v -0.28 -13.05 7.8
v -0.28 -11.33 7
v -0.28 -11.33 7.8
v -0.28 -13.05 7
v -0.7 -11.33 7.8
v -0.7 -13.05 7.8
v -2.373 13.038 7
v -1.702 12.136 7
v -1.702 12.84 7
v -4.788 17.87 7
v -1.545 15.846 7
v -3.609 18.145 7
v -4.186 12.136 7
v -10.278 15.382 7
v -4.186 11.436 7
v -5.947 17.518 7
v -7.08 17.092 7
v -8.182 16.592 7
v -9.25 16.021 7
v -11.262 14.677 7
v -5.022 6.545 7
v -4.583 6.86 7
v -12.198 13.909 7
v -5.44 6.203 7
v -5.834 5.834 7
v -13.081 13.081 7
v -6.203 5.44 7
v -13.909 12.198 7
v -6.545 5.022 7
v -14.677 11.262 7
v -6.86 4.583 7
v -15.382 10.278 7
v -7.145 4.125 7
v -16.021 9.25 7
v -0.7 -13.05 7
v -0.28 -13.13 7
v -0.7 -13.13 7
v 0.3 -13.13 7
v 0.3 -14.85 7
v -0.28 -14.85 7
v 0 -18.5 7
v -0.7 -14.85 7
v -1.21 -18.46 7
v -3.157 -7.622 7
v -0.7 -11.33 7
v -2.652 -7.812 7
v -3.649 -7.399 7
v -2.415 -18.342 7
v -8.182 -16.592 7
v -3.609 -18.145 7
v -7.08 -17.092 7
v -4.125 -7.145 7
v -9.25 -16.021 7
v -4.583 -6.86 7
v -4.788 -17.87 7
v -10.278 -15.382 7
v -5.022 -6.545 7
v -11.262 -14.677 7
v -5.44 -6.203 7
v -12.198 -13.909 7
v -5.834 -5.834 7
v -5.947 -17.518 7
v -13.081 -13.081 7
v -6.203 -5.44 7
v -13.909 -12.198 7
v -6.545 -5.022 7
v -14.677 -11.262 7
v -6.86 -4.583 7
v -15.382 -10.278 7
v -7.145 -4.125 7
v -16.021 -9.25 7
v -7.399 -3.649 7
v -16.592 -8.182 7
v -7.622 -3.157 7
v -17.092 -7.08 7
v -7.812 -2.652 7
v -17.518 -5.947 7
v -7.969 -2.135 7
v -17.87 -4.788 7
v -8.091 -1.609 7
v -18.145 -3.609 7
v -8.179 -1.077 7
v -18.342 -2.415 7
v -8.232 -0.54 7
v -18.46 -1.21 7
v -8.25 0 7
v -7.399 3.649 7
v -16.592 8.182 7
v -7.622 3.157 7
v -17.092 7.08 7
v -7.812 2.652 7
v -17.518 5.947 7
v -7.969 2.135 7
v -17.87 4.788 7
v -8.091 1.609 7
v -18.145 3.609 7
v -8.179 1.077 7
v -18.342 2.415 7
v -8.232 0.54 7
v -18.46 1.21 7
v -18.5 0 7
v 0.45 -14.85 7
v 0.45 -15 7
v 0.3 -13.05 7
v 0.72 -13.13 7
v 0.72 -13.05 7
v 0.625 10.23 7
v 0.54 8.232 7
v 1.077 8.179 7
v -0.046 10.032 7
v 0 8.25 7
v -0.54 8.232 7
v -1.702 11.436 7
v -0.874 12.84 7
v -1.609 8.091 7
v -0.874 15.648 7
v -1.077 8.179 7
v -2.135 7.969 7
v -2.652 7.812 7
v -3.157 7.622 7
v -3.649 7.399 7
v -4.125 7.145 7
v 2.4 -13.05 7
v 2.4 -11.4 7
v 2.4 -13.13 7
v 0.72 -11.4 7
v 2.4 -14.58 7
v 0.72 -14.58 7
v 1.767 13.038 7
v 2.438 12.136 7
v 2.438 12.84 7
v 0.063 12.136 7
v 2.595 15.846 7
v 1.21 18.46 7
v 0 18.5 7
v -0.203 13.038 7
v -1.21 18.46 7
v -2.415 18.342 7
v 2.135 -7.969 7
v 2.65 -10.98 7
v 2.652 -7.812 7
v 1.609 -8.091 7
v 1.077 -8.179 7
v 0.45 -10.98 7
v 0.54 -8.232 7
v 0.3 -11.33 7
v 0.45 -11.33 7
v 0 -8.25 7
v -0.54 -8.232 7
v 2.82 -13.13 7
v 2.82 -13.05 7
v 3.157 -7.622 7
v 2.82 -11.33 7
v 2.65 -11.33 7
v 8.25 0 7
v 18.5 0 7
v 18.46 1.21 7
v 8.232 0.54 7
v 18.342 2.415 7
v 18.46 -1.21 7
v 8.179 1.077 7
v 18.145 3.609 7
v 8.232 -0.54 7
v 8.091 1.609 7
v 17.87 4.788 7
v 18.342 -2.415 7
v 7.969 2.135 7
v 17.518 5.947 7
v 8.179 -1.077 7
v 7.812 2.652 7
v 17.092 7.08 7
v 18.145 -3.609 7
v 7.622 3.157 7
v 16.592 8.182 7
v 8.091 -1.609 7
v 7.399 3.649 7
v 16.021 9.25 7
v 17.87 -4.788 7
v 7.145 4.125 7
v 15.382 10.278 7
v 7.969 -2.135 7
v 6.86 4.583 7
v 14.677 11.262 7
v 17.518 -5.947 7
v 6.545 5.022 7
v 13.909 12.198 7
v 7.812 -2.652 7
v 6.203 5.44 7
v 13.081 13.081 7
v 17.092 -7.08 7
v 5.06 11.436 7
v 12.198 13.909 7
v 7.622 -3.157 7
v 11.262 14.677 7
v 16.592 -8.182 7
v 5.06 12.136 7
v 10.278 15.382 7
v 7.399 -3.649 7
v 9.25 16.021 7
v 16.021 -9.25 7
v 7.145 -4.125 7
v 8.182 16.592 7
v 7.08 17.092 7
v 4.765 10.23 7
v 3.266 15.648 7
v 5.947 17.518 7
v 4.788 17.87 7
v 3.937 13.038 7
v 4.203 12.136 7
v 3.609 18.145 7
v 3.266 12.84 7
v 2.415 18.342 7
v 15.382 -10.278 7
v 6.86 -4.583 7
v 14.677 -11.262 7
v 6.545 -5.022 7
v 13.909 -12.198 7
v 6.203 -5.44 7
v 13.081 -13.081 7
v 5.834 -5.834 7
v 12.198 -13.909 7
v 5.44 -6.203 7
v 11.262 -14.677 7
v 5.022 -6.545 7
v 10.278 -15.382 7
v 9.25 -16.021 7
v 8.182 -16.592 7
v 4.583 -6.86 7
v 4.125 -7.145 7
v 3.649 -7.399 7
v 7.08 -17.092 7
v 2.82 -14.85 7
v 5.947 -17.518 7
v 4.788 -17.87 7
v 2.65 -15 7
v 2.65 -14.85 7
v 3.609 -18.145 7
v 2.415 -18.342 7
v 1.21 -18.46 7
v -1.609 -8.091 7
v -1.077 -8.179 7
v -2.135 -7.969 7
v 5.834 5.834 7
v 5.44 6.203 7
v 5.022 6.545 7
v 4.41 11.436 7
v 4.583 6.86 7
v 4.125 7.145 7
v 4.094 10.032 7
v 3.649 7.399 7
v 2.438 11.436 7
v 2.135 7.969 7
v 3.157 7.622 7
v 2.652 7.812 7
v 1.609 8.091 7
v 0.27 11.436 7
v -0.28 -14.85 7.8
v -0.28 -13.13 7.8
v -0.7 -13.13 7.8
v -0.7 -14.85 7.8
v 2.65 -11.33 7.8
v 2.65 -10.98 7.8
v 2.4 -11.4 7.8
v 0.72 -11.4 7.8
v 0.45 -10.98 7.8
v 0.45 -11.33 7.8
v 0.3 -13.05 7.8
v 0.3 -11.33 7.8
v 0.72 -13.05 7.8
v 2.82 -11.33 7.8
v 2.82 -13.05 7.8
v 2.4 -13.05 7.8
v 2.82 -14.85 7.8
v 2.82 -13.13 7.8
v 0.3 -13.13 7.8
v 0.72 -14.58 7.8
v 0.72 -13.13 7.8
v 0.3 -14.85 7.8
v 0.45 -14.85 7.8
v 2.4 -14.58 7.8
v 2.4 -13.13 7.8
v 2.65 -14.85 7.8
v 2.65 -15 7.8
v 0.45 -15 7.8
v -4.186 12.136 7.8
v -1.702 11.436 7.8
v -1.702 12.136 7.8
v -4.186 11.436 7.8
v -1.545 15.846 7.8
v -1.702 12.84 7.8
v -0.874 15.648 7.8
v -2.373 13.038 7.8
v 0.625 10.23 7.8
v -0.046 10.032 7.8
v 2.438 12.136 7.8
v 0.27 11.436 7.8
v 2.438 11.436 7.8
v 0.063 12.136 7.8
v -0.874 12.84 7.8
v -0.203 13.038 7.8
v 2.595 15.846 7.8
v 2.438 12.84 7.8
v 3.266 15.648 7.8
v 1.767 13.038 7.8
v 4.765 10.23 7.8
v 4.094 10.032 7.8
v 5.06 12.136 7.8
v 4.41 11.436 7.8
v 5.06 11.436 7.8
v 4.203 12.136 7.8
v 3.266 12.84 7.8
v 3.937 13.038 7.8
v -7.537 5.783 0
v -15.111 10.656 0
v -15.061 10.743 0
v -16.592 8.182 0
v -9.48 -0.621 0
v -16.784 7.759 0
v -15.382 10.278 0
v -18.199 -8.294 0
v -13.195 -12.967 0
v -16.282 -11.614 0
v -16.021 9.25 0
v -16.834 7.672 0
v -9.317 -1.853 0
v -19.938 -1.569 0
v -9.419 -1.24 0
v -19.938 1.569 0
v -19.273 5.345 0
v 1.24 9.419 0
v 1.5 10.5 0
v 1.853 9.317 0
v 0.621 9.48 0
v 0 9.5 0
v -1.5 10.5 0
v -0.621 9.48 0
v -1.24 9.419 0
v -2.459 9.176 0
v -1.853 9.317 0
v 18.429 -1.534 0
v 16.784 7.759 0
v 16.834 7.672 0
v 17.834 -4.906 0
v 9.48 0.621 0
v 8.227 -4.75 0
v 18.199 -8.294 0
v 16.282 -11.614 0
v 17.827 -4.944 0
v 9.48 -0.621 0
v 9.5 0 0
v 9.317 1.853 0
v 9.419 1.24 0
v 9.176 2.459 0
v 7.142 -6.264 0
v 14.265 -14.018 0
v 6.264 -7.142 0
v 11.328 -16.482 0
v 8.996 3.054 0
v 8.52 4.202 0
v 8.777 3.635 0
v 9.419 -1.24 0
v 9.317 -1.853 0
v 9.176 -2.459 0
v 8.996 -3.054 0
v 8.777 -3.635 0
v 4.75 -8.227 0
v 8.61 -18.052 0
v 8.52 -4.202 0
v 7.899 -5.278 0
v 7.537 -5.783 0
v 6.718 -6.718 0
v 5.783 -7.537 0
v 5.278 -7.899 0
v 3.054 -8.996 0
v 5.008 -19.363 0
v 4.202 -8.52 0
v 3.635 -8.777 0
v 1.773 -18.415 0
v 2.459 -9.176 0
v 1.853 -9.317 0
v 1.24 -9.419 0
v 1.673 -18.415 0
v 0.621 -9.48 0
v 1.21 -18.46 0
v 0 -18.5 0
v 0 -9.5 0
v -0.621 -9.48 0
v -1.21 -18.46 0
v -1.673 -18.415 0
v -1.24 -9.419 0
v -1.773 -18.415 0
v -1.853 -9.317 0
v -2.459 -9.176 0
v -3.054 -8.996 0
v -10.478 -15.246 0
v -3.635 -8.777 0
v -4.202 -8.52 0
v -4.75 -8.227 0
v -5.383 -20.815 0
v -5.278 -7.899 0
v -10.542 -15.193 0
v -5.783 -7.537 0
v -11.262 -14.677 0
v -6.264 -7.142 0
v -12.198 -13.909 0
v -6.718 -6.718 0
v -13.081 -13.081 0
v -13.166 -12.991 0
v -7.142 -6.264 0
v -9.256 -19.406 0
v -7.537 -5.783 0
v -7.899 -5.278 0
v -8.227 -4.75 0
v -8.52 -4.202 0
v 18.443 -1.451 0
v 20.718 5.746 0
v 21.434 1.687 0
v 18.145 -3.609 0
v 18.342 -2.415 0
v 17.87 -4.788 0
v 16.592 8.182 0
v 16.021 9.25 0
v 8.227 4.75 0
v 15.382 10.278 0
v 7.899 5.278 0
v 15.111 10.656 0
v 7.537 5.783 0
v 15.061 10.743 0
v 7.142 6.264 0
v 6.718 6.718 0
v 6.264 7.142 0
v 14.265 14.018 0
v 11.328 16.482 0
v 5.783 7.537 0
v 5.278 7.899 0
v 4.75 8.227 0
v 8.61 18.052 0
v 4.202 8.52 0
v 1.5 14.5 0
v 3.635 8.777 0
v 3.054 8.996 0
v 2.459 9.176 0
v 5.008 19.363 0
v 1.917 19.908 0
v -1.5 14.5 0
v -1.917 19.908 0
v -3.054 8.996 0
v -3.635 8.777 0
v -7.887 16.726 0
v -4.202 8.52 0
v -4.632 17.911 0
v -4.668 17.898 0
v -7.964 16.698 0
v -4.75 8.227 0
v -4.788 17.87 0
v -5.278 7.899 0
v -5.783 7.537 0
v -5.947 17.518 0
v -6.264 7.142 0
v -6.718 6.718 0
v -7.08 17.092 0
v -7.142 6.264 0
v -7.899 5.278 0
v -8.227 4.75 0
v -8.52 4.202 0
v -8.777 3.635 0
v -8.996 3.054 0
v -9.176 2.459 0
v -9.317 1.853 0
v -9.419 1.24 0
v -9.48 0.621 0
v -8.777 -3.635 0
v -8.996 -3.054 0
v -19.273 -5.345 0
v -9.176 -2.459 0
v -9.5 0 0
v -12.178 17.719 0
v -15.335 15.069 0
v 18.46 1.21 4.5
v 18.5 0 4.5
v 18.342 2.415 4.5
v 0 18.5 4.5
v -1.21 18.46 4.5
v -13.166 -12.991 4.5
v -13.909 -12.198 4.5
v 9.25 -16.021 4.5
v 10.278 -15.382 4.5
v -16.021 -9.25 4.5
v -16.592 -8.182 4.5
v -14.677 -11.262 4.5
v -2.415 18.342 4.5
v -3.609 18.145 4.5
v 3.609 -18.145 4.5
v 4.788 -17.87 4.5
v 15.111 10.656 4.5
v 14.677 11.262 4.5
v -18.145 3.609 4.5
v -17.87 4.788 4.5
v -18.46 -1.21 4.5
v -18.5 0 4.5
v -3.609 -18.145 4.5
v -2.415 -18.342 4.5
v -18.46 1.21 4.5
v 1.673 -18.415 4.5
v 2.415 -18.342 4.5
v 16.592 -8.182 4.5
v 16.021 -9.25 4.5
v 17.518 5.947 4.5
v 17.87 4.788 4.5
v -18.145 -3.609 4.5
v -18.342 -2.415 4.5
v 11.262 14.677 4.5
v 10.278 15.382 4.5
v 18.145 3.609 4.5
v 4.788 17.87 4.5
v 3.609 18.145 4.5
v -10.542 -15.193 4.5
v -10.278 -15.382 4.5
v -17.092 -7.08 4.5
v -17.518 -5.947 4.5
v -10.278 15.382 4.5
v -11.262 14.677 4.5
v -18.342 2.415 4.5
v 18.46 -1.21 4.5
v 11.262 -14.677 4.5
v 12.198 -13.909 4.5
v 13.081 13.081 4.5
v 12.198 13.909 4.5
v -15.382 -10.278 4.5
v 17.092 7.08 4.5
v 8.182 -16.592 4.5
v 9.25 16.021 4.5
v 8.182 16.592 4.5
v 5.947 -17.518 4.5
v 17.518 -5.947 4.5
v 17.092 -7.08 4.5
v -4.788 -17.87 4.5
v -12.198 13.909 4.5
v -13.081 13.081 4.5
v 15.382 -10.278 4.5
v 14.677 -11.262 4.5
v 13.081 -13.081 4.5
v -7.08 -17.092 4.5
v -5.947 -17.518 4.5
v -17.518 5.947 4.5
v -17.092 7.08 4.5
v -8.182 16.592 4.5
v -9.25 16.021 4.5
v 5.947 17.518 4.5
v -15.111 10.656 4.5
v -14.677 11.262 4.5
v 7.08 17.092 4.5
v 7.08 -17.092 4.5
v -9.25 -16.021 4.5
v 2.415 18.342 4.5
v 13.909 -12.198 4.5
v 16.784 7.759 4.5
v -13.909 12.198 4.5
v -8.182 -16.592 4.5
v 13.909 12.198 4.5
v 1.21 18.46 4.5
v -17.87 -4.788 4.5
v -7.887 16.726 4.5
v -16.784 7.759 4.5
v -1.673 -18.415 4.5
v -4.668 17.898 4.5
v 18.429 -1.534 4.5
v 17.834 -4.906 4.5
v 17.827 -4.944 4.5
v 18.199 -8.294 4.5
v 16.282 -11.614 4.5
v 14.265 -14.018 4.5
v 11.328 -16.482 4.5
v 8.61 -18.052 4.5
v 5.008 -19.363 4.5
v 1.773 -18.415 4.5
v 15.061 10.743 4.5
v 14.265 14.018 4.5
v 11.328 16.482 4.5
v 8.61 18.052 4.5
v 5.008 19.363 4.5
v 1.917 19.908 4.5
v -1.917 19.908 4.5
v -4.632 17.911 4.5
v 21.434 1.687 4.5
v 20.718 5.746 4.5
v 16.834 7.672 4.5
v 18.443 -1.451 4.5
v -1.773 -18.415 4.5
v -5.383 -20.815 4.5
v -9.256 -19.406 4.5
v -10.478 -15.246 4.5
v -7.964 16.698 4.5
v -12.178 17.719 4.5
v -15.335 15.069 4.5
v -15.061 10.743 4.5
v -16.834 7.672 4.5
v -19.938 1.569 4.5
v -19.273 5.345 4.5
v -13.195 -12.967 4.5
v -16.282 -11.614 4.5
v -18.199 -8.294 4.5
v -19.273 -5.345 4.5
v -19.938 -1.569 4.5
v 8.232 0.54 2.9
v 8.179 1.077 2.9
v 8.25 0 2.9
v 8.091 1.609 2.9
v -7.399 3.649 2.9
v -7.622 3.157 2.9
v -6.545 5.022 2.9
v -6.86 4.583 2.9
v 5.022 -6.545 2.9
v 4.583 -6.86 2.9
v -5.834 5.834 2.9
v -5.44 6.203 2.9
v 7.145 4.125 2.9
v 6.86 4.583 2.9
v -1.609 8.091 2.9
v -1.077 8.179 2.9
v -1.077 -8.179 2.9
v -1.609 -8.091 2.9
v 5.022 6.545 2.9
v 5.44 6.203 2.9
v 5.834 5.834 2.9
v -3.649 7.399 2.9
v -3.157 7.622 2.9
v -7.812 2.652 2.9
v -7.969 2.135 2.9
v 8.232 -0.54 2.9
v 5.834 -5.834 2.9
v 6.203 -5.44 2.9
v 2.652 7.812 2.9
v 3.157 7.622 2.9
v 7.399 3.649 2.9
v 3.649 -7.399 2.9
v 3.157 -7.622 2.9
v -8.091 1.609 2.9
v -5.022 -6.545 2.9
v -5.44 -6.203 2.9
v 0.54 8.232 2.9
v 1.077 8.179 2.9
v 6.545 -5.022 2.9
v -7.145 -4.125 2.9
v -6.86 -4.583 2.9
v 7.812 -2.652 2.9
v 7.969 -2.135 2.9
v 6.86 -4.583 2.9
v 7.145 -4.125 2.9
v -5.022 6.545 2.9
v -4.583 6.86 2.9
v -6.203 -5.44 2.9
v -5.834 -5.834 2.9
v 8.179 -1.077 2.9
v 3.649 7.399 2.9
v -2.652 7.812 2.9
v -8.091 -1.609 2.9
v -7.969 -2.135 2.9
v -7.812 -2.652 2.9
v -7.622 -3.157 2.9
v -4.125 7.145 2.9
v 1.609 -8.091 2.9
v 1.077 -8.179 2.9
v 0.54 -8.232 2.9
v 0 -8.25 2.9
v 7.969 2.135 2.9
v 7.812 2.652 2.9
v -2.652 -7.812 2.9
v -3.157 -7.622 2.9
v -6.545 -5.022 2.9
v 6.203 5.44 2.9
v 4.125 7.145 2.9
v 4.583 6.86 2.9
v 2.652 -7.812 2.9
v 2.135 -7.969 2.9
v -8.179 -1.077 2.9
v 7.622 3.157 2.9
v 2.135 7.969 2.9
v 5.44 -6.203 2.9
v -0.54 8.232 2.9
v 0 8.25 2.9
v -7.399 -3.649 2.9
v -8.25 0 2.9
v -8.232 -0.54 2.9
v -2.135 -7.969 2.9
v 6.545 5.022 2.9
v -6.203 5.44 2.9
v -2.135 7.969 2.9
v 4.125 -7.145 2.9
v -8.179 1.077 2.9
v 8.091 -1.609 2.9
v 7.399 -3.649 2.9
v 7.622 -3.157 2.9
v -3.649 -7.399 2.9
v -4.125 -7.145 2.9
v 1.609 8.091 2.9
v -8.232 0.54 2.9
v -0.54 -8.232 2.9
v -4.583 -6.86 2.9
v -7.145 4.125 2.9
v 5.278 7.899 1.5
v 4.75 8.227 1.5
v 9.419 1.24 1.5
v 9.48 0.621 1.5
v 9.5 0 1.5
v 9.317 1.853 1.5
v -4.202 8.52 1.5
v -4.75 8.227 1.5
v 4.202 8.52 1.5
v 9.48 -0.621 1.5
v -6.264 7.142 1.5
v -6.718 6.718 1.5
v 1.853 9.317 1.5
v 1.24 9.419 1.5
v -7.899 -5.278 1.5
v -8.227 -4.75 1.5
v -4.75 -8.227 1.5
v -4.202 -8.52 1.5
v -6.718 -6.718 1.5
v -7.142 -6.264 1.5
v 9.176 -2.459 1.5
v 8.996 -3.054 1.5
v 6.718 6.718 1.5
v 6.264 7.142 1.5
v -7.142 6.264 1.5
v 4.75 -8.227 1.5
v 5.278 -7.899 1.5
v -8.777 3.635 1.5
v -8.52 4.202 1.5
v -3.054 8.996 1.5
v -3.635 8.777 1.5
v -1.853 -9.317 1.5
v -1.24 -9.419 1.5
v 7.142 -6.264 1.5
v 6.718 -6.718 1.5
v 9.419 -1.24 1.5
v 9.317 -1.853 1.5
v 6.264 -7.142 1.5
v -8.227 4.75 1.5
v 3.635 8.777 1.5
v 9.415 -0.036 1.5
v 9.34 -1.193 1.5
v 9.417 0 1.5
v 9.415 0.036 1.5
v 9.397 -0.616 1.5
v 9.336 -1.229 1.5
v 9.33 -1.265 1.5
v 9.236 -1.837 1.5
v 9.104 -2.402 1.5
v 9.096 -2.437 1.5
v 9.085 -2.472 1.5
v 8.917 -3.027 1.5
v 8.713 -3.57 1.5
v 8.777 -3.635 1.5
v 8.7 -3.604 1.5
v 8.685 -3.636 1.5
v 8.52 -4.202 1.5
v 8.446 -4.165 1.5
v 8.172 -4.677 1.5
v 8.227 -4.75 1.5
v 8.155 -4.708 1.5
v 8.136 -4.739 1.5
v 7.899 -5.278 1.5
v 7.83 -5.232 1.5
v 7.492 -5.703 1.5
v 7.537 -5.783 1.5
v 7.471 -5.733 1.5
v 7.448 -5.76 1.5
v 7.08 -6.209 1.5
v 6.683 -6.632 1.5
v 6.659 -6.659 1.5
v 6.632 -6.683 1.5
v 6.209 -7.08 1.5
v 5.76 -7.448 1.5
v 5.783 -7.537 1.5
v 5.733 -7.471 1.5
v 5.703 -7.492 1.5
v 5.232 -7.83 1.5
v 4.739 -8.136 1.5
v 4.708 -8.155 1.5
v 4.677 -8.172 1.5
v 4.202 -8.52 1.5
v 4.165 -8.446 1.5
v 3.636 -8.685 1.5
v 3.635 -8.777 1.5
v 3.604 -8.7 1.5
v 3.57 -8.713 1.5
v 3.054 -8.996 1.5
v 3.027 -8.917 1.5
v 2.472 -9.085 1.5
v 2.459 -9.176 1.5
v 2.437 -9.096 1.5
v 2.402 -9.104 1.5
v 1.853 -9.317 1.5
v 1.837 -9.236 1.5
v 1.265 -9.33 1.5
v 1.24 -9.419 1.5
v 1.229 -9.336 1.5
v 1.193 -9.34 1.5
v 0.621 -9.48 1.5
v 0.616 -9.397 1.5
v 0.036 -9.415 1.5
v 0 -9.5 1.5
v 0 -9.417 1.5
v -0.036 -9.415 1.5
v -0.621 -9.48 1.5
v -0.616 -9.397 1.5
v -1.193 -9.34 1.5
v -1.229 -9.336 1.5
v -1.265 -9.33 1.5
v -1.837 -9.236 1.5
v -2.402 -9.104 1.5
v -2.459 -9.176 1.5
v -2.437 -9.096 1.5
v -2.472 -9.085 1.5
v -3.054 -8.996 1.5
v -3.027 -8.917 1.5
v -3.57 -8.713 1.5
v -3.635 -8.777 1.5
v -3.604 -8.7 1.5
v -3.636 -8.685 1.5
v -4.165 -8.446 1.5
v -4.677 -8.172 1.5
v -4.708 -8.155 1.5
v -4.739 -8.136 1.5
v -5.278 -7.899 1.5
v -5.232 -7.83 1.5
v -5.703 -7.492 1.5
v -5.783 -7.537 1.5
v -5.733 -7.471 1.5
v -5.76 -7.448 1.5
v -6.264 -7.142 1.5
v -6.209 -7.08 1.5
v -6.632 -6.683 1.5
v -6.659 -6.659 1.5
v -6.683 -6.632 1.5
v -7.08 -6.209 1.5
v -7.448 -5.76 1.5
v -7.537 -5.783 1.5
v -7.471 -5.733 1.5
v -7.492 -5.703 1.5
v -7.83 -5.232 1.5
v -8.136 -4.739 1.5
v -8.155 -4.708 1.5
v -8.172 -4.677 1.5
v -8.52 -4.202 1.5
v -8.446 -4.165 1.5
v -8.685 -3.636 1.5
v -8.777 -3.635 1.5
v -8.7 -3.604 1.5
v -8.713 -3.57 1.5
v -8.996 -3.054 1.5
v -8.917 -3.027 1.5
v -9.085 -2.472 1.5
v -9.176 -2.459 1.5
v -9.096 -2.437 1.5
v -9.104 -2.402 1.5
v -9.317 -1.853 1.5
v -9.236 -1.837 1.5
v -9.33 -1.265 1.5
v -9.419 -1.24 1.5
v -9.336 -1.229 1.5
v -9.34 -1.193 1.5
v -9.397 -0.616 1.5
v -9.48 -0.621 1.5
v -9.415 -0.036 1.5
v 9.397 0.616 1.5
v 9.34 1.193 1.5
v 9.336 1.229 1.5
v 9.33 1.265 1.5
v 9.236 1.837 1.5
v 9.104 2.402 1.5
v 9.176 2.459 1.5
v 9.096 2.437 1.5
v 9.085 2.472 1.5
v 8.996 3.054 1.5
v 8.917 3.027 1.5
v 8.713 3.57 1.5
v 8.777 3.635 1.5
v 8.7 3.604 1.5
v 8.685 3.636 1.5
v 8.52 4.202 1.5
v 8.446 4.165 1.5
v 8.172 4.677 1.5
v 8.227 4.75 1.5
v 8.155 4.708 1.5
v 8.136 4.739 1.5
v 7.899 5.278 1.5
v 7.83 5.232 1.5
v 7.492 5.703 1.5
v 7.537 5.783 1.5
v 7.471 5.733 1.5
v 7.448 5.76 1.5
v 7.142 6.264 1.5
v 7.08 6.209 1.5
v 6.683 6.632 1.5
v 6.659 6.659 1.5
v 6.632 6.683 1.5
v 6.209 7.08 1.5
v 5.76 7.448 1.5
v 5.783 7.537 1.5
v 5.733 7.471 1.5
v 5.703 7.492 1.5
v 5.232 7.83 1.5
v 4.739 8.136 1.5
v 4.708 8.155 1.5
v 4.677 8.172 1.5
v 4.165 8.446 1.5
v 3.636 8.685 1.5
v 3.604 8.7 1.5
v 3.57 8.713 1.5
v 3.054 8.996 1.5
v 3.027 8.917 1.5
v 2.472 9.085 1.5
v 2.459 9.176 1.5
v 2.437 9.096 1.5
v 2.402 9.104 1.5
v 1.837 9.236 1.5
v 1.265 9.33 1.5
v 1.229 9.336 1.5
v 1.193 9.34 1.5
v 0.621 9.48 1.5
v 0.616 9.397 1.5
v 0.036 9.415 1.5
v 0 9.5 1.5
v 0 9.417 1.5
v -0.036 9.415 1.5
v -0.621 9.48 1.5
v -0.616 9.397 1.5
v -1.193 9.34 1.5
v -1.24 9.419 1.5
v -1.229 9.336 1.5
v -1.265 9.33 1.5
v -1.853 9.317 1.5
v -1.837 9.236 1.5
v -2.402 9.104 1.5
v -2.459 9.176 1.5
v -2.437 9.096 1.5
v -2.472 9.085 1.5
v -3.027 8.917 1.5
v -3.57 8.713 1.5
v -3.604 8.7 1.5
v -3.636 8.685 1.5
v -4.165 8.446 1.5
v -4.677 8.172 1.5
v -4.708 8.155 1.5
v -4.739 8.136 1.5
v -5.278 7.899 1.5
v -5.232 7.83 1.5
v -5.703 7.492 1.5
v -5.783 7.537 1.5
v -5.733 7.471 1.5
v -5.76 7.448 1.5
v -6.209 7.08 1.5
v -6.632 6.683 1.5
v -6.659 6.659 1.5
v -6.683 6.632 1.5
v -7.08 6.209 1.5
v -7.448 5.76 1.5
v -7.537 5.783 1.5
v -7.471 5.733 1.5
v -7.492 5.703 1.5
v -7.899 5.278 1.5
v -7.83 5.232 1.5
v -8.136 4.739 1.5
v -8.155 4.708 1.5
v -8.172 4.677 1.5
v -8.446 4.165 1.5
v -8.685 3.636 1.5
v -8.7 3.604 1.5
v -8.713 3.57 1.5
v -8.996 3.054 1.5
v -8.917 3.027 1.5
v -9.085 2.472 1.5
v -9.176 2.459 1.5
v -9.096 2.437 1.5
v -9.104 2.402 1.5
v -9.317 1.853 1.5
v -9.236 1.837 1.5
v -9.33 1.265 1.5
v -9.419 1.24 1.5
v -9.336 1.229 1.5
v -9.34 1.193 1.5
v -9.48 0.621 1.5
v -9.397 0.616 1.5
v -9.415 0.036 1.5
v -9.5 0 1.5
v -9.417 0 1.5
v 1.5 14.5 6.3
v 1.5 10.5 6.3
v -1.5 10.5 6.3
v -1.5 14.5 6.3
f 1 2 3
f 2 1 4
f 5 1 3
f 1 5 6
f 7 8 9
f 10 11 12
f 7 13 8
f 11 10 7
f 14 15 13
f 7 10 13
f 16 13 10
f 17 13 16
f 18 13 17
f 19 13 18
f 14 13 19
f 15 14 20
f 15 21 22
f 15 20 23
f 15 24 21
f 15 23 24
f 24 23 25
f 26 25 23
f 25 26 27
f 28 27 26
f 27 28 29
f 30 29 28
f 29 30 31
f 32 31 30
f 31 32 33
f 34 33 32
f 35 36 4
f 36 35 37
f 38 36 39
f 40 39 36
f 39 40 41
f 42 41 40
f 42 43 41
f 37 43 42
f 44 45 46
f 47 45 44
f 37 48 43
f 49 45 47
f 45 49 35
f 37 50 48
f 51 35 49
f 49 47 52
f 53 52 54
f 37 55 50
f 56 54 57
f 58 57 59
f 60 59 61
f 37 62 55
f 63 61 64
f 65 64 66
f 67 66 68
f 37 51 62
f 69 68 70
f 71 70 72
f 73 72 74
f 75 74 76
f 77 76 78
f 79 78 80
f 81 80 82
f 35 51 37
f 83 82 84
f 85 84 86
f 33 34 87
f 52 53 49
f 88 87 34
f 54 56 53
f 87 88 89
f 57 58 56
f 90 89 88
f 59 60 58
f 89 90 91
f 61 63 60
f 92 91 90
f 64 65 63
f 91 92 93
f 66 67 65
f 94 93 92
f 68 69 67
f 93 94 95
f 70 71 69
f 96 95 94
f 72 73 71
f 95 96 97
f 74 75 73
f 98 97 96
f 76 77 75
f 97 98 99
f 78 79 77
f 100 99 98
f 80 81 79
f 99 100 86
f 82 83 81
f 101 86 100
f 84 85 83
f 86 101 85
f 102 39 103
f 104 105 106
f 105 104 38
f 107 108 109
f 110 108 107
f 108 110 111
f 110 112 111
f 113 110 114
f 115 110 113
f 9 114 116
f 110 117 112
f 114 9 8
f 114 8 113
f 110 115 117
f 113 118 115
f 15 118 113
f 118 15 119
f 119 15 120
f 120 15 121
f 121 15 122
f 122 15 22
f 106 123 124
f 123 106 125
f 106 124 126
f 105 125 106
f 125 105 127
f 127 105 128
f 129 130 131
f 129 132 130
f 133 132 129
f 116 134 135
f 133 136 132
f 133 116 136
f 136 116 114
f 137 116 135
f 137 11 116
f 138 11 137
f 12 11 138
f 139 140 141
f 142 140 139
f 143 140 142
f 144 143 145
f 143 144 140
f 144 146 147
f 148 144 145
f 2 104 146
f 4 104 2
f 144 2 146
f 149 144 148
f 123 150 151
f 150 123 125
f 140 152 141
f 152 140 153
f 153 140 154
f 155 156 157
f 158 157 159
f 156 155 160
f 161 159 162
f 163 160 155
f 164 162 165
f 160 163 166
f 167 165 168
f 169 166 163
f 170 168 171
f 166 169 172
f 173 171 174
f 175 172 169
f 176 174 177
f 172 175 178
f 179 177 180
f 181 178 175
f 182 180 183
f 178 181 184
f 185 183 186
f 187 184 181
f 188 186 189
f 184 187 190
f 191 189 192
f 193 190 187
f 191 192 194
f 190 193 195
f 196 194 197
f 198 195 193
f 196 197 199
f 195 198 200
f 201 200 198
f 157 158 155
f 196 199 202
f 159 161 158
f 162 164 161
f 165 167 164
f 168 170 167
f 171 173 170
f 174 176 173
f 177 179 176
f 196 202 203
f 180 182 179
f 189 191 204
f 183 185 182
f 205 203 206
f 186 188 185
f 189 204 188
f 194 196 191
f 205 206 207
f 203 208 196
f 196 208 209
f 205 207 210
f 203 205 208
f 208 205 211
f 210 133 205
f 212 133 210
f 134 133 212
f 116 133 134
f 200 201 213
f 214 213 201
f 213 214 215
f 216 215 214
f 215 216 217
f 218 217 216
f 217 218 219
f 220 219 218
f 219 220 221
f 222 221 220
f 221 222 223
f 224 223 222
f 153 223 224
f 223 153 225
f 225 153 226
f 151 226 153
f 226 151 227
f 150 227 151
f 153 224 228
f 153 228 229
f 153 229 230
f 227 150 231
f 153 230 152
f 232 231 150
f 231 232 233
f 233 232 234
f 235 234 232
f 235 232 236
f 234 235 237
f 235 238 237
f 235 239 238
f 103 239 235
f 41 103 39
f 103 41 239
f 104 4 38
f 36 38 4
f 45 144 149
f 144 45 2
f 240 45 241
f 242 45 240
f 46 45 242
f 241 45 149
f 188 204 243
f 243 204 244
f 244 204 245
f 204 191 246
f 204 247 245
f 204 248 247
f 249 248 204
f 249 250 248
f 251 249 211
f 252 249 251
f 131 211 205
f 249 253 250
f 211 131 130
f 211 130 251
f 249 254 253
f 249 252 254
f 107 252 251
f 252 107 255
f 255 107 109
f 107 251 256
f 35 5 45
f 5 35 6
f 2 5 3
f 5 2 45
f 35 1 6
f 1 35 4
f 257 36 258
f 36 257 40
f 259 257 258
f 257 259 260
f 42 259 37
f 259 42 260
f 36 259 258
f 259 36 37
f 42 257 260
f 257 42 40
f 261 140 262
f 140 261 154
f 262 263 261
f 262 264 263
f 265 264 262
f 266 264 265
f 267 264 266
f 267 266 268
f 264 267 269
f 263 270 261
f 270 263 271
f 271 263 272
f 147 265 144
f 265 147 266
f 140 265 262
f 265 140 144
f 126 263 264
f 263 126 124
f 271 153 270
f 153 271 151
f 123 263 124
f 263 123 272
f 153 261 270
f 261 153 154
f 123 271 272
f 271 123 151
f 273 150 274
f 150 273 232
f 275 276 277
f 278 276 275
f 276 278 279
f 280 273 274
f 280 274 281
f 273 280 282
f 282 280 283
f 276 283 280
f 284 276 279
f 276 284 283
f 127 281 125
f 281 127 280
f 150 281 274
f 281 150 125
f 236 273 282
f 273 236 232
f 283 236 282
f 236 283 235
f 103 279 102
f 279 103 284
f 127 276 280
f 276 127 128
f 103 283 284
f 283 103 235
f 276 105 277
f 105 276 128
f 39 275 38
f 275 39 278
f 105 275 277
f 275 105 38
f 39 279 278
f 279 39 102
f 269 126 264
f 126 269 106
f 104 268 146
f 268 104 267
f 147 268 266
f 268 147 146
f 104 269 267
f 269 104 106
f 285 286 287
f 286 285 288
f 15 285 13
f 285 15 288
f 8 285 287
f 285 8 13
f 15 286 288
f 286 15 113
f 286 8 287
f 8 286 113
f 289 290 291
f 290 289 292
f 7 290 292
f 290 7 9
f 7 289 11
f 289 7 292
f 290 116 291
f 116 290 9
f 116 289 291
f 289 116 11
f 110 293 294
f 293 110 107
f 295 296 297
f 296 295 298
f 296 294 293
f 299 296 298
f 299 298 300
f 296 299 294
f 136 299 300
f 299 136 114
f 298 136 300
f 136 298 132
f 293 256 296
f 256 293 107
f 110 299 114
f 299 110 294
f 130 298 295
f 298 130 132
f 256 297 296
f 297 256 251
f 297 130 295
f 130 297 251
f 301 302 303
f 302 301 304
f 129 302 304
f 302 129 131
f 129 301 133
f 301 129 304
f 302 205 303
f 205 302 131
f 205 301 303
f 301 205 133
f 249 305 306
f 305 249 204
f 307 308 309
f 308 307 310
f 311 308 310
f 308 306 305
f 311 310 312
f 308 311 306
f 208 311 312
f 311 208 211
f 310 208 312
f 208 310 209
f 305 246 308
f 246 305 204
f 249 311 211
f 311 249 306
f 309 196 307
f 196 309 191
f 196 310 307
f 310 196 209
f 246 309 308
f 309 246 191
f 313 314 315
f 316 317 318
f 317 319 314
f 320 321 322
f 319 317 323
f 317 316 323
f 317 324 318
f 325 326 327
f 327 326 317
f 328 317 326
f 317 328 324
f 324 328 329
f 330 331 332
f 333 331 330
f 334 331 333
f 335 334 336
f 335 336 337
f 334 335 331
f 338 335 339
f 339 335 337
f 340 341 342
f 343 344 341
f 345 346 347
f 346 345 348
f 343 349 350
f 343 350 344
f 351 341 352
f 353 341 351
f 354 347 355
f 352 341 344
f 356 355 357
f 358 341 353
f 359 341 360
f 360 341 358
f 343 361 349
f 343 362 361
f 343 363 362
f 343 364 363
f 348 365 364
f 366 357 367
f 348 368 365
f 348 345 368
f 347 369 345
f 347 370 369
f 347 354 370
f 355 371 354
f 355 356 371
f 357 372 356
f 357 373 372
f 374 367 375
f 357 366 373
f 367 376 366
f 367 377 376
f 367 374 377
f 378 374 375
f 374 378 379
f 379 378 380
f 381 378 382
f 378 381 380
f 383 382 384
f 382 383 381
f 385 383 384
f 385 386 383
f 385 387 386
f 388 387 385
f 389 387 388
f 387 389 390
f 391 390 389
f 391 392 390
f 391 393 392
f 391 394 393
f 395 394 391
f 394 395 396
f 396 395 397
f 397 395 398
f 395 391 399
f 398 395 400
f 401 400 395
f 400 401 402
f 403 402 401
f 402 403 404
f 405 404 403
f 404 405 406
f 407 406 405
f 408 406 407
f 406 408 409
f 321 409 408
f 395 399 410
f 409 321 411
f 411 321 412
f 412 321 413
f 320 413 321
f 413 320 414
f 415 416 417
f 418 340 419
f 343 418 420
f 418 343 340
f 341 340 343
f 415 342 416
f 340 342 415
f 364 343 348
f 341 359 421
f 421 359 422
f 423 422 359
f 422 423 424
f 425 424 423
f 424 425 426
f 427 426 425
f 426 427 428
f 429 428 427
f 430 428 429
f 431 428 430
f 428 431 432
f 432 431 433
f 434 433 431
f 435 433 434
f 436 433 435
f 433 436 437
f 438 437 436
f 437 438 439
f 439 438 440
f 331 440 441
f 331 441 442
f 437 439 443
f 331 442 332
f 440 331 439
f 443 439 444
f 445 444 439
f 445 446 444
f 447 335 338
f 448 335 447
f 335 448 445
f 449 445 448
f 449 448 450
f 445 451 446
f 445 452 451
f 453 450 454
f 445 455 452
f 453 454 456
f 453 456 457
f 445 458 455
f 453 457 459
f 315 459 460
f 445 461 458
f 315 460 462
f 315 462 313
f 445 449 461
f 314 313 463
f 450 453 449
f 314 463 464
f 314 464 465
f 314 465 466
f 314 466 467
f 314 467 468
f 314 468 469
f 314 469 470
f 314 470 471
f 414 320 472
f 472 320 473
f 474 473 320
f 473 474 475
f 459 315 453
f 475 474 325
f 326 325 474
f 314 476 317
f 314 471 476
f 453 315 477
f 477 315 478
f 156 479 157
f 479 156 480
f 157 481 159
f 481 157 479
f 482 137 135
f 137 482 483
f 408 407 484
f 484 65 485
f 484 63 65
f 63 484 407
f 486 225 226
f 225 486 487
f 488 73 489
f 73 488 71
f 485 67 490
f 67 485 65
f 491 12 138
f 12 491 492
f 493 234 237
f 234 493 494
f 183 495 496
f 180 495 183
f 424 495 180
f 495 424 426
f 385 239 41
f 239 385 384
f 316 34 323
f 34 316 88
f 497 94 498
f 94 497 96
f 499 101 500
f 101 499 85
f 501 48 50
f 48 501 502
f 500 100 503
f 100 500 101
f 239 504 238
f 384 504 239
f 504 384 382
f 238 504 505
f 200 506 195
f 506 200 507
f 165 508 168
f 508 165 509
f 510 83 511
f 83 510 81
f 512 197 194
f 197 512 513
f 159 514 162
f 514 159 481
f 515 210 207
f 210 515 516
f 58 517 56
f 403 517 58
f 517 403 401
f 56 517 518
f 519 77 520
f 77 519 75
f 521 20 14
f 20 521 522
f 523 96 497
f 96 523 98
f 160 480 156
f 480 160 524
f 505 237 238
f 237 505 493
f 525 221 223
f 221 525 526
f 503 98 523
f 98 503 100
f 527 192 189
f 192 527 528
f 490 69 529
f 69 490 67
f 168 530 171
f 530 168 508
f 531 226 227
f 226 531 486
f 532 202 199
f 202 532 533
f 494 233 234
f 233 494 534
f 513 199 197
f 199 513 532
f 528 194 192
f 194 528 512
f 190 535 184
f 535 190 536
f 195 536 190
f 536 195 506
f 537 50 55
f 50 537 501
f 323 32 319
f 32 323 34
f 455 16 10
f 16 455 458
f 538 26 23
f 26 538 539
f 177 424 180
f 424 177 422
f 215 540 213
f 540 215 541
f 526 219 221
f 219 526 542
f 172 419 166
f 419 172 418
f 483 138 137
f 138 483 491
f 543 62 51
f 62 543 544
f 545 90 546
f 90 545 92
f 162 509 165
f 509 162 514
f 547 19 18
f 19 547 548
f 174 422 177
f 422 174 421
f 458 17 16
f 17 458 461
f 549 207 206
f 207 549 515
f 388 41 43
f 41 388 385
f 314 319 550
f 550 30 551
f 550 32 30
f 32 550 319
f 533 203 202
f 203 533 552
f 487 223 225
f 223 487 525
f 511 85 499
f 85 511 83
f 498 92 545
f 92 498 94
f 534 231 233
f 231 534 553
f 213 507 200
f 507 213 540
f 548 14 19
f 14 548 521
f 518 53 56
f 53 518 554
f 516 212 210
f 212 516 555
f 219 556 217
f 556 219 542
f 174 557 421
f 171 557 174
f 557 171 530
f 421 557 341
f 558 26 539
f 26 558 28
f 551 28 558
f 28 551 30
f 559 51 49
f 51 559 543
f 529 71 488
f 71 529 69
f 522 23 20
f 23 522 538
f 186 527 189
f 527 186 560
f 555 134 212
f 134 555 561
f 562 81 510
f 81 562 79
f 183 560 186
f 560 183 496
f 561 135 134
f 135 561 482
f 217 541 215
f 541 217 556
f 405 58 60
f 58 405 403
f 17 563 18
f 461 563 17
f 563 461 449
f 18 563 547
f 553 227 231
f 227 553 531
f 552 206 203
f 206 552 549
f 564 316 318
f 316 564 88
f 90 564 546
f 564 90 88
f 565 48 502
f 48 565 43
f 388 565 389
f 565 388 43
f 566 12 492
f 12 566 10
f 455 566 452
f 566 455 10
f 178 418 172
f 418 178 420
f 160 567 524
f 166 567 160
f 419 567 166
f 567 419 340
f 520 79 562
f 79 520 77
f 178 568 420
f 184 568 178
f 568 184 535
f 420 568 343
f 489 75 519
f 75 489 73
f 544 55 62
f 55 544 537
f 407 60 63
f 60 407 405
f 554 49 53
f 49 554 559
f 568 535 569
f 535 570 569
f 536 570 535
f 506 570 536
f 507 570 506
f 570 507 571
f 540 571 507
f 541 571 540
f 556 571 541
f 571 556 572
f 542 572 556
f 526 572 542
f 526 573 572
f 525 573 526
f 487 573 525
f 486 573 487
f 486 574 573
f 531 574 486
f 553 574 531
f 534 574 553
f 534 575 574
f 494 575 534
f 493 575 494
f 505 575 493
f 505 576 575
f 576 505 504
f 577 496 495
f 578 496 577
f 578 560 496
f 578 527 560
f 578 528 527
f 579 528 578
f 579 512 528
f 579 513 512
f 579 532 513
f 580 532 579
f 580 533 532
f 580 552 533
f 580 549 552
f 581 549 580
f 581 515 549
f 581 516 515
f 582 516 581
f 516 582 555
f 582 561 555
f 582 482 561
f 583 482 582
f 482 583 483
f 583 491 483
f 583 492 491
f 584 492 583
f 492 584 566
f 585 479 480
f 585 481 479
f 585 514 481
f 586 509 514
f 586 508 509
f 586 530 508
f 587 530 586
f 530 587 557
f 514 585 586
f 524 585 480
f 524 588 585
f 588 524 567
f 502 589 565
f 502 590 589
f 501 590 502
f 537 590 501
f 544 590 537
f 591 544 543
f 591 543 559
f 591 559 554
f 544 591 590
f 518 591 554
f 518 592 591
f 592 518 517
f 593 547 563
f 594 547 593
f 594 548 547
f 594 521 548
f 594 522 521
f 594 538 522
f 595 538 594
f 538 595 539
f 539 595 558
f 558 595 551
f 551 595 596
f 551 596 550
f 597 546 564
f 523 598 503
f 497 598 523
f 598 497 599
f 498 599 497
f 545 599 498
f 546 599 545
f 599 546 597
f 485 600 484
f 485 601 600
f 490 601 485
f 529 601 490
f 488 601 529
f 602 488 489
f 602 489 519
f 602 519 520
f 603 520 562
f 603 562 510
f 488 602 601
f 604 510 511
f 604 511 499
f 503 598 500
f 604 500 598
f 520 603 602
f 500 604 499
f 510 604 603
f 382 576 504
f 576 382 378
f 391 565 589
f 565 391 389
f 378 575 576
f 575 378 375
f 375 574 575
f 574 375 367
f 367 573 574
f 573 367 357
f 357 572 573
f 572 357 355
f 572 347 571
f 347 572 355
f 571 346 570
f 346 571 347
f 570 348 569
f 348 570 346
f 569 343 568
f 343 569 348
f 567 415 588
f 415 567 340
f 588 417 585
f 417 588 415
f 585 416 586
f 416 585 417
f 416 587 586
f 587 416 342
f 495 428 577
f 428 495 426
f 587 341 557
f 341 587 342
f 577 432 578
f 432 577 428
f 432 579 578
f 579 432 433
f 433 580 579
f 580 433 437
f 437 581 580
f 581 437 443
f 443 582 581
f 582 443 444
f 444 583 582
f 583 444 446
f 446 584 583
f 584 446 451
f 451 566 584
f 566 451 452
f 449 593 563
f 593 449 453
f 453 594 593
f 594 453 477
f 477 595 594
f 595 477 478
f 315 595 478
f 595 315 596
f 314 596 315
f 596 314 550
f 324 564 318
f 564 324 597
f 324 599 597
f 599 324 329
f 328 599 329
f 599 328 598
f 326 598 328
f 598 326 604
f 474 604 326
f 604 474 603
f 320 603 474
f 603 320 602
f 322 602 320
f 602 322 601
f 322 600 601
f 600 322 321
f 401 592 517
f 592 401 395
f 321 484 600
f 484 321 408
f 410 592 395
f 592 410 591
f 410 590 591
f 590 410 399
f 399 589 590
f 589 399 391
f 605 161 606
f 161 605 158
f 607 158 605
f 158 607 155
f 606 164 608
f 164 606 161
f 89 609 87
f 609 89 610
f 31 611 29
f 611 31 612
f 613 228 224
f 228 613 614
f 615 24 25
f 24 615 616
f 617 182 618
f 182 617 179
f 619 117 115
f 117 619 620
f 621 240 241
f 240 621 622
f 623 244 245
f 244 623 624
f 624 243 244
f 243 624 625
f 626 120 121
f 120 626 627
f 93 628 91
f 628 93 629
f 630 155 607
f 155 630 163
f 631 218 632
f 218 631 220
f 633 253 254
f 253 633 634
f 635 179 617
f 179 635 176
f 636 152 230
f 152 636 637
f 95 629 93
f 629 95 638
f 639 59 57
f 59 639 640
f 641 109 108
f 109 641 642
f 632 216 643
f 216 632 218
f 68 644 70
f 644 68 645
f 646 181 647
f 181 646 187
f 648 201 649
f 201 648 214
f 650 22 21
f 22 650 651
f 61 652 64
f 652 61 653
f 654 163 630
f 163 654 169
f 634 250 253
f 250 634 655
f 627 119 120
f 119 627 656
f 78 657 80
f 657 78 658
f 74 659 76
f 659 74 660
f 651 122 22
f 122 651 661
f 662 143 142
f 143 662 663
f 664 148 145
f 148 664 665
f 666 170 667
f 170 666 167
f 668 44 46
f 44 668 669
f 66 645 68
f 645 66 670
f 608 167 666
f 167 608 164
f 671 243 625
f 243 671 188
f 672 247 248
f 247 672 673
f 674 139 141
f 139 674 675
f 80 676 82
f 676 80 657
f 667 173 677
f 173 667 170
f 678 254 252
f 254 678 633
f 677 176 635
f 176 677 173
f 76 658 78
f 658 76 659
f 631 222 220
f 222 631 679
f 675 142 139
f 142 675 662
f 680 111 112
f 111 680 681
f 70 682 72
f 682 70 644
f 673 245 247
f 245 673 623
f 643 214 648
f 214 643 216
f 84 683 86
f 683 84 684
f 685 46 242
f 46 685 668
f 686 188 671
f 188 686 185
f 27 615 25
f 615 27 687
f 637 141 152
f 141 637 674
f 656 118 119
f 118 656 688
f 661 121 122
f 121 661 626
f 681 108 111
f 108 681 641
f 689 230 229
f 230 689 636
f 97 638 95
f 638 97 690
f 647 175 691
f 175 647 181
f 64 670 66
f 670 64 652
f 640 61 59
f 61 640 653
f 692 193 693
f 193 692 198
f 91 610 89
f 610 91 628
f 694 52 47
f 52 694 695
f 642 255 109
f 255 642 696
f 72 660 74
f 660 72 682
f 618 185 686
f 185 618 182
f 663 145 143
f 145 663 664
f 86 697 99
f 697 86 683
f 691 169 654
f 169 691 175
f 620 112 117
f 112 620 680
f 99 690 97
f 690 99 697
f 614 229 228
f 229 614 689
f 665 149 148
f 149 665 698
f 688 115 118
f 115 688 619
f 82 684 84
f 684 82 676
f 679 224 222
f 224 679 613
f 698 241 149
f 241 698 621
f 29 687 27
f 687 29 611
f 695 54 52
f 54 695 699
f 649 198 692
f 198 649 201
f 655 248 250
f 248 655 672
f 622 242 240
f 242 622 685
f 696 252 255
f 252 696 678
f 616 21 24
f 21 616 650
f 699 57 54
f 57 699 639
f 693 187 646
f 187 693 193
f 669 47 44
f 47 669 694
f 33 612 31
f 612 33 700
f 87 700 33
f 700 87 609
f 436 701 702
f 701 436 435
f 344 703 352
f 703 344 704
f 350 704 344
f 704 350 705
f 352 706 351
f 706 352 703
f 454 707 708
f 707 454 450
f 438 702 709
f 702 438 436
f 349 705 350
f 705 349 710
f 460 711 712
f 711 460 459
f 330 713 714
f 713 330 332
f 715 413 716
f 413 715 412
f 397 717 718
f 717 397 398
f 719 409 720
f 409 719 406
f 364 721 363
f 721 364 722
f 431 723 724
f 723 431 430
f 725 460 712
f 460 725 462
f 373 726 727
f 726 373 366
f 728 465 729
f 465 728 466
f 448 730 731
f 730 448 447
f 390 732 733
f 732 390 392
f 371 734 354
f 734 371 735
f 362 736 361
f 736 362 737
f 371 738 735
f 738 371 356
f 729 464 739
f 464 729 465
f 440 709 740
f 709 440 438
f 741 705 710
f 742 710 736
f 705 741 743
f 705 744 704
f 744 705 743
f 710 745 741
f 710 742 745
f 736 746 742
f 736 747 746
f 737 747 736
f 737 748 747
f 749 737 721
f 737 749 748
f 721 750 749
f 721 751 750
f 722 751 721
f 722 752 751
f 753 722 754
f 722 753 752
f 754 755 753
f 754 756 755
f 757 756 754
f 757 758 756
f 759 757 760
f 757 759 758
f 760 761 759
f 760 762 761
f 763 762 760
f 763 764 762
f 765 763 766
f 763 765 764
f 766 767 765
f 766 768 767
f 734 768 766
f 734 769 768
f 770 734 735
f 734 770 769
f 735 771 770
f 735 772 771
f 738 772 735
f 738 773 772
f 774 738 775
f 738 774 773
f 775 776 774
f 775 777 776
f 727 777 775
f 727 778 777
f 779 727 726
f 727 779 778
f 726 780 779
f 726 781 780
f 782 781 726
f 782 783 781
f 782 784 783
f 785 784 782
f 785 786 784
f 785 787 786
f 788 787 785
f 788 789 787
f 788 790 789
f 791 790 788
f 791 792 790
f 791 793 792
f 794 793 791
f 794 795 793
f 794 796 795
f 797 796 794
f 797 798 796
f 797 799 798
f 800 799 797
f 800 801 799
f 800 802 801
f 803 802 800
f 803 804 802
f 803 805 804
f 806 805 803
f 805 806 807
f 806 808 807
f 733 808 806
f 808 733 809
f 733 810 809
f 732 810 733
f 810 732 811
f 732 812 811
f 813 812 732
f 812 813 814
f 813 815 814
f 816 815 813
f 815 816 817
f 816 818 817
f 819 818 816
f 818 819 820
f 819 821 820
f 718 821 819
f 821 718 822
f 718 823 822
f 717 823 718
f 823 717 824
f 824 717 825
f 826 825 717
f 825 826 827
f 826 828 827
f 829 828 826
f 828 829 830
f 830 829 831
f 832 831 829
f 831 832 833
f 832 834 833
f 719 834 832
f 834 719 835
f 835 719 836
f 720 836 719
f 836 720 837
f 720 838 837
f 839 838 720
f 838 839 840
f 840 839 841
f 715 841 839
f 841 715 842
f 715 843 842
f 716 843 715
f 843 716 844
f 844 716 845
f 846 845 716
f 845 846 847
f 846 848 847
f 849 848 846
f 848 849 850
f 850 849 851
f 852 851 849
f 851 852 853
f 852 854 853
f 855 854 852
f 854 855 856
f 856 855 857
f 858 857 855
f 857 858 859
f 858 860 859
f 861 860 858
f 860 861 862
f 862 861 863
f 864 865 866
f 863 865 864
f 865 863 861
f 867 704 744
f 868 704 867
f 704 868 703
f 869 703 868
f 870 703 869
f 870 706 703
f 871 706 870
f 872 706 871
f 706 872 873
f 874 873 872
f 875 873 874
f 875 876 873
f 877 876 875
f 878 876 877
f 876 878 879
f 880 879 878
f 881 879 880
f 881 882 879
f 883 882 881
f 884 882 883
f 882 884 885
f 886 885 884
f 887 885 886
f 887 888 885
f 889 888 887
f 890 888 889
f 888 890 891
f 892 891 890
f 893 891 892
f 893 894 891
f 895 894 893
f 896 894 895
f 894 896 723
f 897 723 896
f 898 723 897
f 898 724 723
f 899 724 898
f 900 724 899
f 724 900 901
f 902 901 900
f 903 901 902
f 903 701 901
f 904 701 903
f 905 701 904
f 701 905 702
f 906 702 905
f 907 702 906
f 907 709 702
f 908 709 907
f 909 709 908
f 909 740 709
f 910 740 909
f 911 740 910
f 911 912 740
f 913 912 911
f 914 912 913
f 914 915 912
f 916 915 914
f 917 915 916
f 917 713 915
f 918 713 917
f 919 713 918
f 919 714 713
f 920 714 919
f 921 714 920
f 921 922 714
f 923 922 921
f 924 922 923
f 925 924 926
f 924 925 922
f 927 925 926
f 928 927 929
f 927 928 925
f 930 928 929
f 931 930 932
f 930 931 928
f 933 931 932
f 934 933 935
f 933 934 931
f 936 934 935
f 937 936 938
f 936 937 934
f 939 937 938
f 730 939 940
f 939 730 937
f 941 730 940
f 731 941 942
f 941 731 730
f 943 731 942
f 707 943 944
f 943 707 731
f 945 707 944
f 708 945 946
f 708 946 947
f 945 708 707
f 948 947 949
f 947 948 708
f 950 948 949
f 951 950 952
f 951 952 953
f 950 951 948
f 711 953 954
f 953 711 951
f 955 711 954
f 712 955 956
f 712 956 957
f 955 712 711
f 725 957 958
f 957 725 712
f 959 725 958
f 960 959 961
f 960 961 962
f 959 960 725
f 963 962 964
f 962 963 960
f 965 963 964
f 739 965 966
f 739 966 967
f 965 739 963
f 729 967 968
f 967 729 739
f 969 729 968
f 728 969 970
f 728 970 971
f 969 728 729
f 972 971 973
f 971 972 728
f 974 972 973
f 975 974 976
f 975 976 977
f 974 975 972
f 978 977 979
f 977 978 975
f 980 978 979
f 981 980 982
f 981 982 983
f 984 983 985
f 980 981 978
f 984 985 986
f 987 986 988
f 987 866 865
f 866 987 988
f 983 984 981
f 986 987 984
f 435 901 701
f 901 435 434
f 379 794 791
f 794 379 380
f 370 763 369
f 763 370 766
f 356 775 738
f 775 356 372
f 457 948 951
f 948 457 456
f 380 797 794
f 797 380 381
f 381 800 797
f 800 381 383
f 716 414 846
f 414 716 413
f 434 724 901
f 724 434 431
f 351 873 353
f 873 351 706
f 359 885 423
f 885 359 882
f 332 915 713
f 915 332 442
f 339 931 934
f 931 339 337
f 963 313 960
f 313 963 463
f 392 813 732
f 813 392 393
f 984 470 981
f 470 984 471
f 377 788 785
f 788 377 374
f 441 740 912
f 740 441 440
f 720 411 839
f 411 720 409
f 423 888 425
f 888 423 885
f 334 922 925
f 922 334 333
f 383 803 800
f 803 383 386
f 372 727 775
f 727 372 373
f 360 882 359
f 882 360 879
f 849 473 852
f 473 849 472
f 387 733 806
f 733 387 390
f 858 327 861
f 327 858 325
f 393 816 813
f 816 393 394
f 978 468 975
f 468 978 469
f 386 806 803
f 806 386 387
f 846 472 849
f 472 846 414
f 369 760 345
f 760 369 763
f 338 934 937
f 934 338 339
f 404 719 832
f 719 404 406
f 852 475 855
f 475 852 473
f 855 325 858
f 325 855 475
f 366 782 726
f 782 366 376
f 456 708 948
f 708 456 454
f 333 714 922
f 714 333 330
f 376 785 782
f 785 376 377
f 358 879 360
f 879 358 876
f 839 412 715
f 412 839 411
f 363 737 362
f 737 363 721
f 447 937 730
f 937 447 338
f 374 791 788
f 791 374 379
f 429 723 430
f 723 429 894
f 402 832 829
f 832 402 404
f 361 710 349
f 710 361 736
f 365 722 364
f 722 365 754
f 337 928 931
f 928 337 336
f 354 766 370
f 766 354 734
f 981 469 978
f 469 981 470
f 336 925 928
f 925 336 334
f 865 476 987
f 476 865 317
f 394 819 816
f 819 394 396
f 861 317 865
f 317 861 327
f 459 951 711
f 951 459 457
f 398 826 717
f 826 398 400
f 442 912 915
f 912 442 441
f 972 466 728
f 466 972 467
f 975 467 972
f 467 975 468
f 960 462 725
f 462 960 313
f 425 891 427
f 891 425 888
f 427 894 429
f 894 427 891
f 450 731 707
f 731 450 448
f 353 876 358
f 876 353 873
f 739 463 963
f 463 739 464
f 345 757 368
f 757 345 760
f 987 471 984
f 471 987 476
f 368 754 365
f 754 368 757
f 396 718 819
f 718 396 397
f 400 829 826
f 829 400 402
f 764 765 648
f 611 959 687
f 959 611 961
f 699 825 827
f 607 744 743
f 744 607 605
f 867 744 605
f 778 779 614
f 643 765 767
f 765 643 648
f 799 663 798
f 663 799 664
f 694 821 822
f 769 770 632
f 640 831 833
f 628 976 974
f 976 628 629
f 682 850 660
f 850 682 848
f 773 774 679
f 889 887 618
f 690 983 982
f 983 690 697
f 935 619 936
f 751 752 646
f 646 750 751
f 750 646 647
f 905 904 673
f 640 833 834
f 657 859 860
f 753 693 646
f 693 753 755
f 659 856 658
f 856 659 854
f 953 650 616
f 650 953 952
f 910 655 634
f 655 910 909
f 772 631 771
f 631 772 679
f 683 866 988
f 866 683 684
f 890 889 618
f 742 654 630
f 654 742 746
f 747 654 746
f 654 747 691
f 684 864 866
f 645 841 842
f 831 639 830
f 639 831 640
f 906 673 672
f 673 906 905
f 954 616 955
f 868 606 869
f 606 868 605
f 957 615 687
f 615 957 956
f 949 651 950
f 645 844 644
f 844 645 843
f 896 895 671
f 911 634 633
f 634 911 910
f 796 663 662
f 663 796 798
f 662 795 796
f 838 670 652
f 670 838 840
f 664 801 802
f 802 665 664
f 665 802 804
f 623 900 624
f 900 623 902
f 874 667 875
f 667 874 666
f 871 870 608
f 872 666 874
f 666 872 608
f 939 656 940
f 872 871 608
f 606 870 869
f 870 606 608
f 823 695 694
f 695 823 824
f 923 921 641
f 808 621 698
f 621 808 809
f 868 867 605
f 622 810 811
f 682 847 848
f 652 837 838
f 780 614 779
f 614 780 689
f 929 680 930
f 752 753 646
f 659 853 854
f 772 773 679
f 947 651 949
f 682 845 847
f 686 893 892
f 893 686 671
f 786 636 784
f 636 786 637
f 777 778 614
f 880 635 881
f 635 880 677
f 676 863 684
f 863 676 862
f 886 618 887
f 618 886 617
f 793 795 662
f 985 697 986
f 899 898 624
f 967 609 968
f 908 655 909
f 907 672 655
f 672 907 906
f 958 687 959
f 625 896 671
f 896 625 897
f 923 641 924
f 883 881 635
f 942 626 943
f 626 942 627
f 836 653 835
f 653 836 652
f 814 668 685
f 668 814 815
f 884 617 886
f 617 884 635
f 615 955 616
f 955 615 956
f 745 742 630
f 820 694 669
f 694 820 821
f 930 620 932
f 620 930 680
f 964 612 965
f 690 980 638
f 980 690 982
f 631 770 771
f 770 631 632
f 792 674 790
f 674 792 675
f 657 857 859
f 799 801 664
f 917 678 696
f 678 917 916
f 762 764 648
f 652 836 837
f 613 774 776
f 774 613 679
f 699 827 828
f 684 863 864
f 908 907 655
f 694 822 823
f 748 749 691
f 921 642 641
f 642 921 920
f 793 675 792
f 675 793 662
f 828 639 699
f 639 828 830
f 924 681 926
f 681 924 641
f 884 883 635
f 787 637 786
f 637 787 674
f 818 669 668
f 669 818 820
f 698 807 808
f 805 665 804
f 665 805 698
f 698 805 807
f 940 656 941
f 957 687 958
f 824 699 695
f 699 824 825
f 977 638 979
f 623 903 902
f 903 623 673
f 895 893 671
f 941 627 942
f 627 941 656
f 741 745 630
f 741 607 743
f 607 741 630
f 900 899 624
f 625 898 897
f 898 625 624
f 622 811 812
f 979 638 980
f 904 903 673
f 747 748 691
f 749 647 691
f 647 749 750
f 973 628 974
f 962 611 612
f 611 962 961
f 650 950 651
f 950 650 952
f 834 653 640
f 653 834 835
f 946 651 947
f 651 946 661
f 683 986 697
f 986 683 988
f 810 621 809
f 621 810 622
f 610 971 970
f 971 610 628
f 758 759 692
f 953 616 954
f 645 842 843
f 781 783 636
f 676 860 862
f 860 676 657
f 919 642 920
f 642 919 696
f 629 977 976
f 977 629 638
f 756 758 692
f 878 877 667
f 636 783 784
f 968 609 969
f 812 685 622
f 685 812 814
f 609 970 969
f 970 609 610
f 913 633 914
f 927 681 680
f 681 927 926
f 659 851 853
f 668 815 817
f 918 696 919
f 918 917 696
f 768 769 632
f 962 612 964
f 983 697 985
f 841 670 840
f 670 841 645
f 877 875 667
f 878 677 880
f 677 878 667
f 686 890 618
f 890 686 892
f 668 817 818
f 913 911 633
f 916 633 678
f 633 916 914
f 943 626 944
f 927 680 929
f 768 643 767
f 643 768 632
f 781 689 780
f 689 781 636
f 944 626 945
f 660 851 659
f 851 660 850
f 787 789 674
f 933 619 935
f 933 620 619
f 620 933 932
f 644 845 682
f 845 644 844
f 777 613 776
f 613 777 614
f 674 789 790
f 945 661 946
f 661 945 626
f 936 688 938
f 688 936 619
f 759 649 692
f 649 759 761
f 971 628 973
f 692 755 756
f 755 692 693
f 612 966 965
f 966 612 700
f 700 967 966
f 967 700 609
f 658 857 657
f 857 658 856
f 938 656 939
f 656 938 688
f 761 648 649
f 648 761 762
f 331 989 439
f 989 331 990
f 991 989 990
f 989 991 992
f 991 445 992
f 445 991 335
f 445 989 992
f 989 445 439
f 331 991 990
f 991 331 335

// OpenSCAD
/*
  Elna Supermatic single cam 10
  Name: Blind hem
  Status: candidate
  Visible raised number and stitch preview.

  IMPORTANT:
  Labels are raised geometry, not engraved text. They should be visible in render and print.
  Cam profile is still a candidate and must be verified against real photos/STL.

  License: GPL-3.0-or-later.
*/

$fn = 96;

disc_thickness = 7;
body_radius = 17;
outer_reference_radius = 18.5;
lobe_thickness = 4.5;
label_height = 0.80;

inner_hole_rad = 8.25;
hole_bigger_rad = 9.5;
bigger_hole_ht = 1.5;
hole_cone_ht = 1.5;
cut_errors = 0.1;

gap_to_transporthole = 1;
transporthole_width = 3;
transporthole_depth = 5.5;
transporthole_length = 4;

module lobe_profile() {
    polygon(points=[
        [-1.9169, 19.9079],
        [1.9169, 19.9079],
        [5.0076, 19.3630],
        [8.6102, 18.0517],
        [11.3281, 16.4825],
        [14.2650, 14.0182],
        [15.0611, 10.7430],
        [16.8343, 7.6718],
        [20.7181, 5.7456],
        [21.4337, 1.6869],
        [18.4430, -1.4515],
        [17.8272, -4.9439],
        [18.1992, -8.2939],
        [16.2823, -11.6141],
        [14.2650, -14.0182],
        [11.3281, -16.4825],
        [8.6102, -18.0517],
        [5.0076, -19.3630],
        [1.7731, -18.4148],
        [-1.7731, -18.4148],
        [-5.3832, -20.8152],
        [-9.2560, -19.4056],
        [-10.4785, -15.2463],
        [-13.1951, -12.9668],
        [-16.2823, -11.6141],
        [-18.1992, -8.2939],
        [-19.2726, -5.3448],
        [-19.9383, -1.5692],
        [-19.9383, 1.5692],
        [-19.2726, 5.3448],
        [-16.8343, 7.6718],
        [-15.0611, 10.7430],
        [-15.3349, 15.0695],
        [-12.1777, 17.7187],
        [-7.9645, 16.6978],
        [-4.6320, 17.9107]
    ]);
}

module digit_segments(d) {
    // 7-segment digit, raised from cubes. Local digit approx 2.4 x 4.0 mm.
    seg_w = 2.2;
    seg_t = 0.42;
    seg_v = 1.72;

    module hseg(y) {
        translate([-seg_w/2, y, disc_thickness])
            cube([seg_w, seg_t, label_height]);
    }
    module vseg(x, y) {
        translate([x, y, disc_thickness])
            cube([seg_t, seg_v, label_height]);
    }

    // segment map: a top, b upper-right, c lower-right, d bottom, e lower-left, f upper-left, g middle
    if (d == 0) { hseg(1.8); vseg(0.85,0.15); vseg(0.85,-1.65); hseg(-1.8); vseg(-1.25,-1.65); vseg(-1.25,0.15); }
    if (d == 1) { vseg(0.85,0.15); vseg(0.85,-1.65); }
    if (d == 2) { hseg(1.8); vseg(0.85,0.15); hseg(0); vseg(-1.25,-1.65); hseg(-1.8); }
    if (d == 3) { hseg(1.8); vseg(0.85,0.15); hseg(0); vseg(0.85,-1.65); hseg(-1.8); }
    if (d == 4) { vseg(-1.25,0.15); hseg(0); vseg(0.85,0.15); vseg(0.85,-1.65); }
    if (d == 5) { hseg(1.8); vseg(-1.25,0.15); hseg(0); vseg(0.85,-1.65); hseg(-1.8); }
    if (d == 6) { hseg(1.8); vseg(-1.25,0.15); hseg(0); vseg(0.85,-1.65); vseg(-1.25,-1.65); hseg(-1.8); }
    if (d == 7) { hseg(1.8); vseg(0.85,0.15); vseg(0.85,-1.65); }
    if (d == 8) { hseg(1.8); vseg(0.85,0.15); vseg(0.85,-1.65); hseg(-1.8); vseg(-1.25,-1.65); vseg(-1.25,0.15); hseg(0); }
    if (d == 9) { hseg(1.8); vseg(0.85,0.15); vseg(0.85,-1.65); hseg(-1.8); vseg(-1.25,0.15); hseg(0); }
}

module raised_cam_number() {
    translate([-1.55, -13.2, 0]) digit_segments(1);
    translate([ 1.55, -13.2, 0]) digit_segments(0);
}

module raised_stitch_preview() {
            translate([-4.1860, 11.4360, disc_thickness])
                rotate([0,0,0.0000])
                    cube(size=[0.8280, 0.7000, 0.8000], center=false);
            translate([-3.3580, 11.4360, disc_thickness])
                rotate([0,0,0.0000])
                    cube(size=[0.8280, 0.7000, 0.8000], center=false);
            translate([-2.5300, 11.4360, disc_thickness])
                rotate([0,0,0.0000])
                    cube(size=[0.8280, 0.7000, 0.8000], center=false);
            translate([-1.7020, 12.8400, disc_thickness])
                rotate([0,0,73.5707])
                    cube(size=[2.9275, 0.7000, 0.8000], center=false);
            translate([-0.8740, 12.8400, disc_thickness])
                rotate([0,0,-73.5707])
                    cube(size=[2.9275, 0.7000, 0.8000], center=false);
            translate([-0.0460, 11.4360, disc_thickness])
                rotate([0,0,0.0000])
                    cube(size=[0.8280, 0.7000, 0.8000], center=false);
            translate([0.7820, 11.4360, disc_thickness])
                rotate([0,0,0.0000])
                    cube(size=[0.8280, 0.7000, 0.8000], center=false);
            translate([1.6100, 11.4360, disc_thickness])
                rotate([0,0,0.0000])
                    cube(size=[0.8280, 0.7000, 0.8000], center=false);
            translate([2.4380, 12.8400, disc_thickness])
                rotate([0,0,73.5707])
                    cube(size=[2.9275, 0.7000, 0.8000], center=false);
            translate([3.2660, 12.8400, disc_thickness])
                rotate([0,0,-73.5707])
                    cube(size=[2.9275, 0.7000, 0.8000], center=false);
            translate([4.1400, 11.4360, disc_thickness])
                rotate([0,0,0.0000])
                    cube(size=[0.9200, 0.7000, 0.8000], center=false);
}

module elna_single_cam_10() {
    difference() {
        union() {
            // body
            cylinder(h = disc_thickness, r = body_radius);
            cylinder(h = disc_thickness, r = outer_reference_radius);

            // lower cam contour
            linear_extrude(height = lobe_thickness)
                lobe_profile();

            // visible raised labels
            raised_cam_number();
            raised_stitch_preview();
        }

        // Main shaft hole
        translate([0, 0, disc_thickness / 2])
            cylinder(h = disc_thickness + label_height + 1, r = inner_hole_rad, center = true);

        // Lower widened hole
        translate([0, 0, -cut_errors])
            cylinder(h = bigger_hole_ht + cut_errors, r = hole_bigger_rad);

        // Taper from widened hole to main hole
        translate([0, 0, bigger_hole_ht - cut_errors])
            cylinder(h = hole_cone_ht, r1 = hole_bigger_rad, r2 = inner_hole_rad);

        // Transport slot
        translate([0, hole_bigger_rad + gap_to_transporthole + transporthole_length / 2,
                   transporthole_depth / 2 - cut_errors])
            cube(size = [transporthole_width, transporthole_length, transporthole_depth + label_height + 1], center = true);
    }
}

elna_single_cam_10();
